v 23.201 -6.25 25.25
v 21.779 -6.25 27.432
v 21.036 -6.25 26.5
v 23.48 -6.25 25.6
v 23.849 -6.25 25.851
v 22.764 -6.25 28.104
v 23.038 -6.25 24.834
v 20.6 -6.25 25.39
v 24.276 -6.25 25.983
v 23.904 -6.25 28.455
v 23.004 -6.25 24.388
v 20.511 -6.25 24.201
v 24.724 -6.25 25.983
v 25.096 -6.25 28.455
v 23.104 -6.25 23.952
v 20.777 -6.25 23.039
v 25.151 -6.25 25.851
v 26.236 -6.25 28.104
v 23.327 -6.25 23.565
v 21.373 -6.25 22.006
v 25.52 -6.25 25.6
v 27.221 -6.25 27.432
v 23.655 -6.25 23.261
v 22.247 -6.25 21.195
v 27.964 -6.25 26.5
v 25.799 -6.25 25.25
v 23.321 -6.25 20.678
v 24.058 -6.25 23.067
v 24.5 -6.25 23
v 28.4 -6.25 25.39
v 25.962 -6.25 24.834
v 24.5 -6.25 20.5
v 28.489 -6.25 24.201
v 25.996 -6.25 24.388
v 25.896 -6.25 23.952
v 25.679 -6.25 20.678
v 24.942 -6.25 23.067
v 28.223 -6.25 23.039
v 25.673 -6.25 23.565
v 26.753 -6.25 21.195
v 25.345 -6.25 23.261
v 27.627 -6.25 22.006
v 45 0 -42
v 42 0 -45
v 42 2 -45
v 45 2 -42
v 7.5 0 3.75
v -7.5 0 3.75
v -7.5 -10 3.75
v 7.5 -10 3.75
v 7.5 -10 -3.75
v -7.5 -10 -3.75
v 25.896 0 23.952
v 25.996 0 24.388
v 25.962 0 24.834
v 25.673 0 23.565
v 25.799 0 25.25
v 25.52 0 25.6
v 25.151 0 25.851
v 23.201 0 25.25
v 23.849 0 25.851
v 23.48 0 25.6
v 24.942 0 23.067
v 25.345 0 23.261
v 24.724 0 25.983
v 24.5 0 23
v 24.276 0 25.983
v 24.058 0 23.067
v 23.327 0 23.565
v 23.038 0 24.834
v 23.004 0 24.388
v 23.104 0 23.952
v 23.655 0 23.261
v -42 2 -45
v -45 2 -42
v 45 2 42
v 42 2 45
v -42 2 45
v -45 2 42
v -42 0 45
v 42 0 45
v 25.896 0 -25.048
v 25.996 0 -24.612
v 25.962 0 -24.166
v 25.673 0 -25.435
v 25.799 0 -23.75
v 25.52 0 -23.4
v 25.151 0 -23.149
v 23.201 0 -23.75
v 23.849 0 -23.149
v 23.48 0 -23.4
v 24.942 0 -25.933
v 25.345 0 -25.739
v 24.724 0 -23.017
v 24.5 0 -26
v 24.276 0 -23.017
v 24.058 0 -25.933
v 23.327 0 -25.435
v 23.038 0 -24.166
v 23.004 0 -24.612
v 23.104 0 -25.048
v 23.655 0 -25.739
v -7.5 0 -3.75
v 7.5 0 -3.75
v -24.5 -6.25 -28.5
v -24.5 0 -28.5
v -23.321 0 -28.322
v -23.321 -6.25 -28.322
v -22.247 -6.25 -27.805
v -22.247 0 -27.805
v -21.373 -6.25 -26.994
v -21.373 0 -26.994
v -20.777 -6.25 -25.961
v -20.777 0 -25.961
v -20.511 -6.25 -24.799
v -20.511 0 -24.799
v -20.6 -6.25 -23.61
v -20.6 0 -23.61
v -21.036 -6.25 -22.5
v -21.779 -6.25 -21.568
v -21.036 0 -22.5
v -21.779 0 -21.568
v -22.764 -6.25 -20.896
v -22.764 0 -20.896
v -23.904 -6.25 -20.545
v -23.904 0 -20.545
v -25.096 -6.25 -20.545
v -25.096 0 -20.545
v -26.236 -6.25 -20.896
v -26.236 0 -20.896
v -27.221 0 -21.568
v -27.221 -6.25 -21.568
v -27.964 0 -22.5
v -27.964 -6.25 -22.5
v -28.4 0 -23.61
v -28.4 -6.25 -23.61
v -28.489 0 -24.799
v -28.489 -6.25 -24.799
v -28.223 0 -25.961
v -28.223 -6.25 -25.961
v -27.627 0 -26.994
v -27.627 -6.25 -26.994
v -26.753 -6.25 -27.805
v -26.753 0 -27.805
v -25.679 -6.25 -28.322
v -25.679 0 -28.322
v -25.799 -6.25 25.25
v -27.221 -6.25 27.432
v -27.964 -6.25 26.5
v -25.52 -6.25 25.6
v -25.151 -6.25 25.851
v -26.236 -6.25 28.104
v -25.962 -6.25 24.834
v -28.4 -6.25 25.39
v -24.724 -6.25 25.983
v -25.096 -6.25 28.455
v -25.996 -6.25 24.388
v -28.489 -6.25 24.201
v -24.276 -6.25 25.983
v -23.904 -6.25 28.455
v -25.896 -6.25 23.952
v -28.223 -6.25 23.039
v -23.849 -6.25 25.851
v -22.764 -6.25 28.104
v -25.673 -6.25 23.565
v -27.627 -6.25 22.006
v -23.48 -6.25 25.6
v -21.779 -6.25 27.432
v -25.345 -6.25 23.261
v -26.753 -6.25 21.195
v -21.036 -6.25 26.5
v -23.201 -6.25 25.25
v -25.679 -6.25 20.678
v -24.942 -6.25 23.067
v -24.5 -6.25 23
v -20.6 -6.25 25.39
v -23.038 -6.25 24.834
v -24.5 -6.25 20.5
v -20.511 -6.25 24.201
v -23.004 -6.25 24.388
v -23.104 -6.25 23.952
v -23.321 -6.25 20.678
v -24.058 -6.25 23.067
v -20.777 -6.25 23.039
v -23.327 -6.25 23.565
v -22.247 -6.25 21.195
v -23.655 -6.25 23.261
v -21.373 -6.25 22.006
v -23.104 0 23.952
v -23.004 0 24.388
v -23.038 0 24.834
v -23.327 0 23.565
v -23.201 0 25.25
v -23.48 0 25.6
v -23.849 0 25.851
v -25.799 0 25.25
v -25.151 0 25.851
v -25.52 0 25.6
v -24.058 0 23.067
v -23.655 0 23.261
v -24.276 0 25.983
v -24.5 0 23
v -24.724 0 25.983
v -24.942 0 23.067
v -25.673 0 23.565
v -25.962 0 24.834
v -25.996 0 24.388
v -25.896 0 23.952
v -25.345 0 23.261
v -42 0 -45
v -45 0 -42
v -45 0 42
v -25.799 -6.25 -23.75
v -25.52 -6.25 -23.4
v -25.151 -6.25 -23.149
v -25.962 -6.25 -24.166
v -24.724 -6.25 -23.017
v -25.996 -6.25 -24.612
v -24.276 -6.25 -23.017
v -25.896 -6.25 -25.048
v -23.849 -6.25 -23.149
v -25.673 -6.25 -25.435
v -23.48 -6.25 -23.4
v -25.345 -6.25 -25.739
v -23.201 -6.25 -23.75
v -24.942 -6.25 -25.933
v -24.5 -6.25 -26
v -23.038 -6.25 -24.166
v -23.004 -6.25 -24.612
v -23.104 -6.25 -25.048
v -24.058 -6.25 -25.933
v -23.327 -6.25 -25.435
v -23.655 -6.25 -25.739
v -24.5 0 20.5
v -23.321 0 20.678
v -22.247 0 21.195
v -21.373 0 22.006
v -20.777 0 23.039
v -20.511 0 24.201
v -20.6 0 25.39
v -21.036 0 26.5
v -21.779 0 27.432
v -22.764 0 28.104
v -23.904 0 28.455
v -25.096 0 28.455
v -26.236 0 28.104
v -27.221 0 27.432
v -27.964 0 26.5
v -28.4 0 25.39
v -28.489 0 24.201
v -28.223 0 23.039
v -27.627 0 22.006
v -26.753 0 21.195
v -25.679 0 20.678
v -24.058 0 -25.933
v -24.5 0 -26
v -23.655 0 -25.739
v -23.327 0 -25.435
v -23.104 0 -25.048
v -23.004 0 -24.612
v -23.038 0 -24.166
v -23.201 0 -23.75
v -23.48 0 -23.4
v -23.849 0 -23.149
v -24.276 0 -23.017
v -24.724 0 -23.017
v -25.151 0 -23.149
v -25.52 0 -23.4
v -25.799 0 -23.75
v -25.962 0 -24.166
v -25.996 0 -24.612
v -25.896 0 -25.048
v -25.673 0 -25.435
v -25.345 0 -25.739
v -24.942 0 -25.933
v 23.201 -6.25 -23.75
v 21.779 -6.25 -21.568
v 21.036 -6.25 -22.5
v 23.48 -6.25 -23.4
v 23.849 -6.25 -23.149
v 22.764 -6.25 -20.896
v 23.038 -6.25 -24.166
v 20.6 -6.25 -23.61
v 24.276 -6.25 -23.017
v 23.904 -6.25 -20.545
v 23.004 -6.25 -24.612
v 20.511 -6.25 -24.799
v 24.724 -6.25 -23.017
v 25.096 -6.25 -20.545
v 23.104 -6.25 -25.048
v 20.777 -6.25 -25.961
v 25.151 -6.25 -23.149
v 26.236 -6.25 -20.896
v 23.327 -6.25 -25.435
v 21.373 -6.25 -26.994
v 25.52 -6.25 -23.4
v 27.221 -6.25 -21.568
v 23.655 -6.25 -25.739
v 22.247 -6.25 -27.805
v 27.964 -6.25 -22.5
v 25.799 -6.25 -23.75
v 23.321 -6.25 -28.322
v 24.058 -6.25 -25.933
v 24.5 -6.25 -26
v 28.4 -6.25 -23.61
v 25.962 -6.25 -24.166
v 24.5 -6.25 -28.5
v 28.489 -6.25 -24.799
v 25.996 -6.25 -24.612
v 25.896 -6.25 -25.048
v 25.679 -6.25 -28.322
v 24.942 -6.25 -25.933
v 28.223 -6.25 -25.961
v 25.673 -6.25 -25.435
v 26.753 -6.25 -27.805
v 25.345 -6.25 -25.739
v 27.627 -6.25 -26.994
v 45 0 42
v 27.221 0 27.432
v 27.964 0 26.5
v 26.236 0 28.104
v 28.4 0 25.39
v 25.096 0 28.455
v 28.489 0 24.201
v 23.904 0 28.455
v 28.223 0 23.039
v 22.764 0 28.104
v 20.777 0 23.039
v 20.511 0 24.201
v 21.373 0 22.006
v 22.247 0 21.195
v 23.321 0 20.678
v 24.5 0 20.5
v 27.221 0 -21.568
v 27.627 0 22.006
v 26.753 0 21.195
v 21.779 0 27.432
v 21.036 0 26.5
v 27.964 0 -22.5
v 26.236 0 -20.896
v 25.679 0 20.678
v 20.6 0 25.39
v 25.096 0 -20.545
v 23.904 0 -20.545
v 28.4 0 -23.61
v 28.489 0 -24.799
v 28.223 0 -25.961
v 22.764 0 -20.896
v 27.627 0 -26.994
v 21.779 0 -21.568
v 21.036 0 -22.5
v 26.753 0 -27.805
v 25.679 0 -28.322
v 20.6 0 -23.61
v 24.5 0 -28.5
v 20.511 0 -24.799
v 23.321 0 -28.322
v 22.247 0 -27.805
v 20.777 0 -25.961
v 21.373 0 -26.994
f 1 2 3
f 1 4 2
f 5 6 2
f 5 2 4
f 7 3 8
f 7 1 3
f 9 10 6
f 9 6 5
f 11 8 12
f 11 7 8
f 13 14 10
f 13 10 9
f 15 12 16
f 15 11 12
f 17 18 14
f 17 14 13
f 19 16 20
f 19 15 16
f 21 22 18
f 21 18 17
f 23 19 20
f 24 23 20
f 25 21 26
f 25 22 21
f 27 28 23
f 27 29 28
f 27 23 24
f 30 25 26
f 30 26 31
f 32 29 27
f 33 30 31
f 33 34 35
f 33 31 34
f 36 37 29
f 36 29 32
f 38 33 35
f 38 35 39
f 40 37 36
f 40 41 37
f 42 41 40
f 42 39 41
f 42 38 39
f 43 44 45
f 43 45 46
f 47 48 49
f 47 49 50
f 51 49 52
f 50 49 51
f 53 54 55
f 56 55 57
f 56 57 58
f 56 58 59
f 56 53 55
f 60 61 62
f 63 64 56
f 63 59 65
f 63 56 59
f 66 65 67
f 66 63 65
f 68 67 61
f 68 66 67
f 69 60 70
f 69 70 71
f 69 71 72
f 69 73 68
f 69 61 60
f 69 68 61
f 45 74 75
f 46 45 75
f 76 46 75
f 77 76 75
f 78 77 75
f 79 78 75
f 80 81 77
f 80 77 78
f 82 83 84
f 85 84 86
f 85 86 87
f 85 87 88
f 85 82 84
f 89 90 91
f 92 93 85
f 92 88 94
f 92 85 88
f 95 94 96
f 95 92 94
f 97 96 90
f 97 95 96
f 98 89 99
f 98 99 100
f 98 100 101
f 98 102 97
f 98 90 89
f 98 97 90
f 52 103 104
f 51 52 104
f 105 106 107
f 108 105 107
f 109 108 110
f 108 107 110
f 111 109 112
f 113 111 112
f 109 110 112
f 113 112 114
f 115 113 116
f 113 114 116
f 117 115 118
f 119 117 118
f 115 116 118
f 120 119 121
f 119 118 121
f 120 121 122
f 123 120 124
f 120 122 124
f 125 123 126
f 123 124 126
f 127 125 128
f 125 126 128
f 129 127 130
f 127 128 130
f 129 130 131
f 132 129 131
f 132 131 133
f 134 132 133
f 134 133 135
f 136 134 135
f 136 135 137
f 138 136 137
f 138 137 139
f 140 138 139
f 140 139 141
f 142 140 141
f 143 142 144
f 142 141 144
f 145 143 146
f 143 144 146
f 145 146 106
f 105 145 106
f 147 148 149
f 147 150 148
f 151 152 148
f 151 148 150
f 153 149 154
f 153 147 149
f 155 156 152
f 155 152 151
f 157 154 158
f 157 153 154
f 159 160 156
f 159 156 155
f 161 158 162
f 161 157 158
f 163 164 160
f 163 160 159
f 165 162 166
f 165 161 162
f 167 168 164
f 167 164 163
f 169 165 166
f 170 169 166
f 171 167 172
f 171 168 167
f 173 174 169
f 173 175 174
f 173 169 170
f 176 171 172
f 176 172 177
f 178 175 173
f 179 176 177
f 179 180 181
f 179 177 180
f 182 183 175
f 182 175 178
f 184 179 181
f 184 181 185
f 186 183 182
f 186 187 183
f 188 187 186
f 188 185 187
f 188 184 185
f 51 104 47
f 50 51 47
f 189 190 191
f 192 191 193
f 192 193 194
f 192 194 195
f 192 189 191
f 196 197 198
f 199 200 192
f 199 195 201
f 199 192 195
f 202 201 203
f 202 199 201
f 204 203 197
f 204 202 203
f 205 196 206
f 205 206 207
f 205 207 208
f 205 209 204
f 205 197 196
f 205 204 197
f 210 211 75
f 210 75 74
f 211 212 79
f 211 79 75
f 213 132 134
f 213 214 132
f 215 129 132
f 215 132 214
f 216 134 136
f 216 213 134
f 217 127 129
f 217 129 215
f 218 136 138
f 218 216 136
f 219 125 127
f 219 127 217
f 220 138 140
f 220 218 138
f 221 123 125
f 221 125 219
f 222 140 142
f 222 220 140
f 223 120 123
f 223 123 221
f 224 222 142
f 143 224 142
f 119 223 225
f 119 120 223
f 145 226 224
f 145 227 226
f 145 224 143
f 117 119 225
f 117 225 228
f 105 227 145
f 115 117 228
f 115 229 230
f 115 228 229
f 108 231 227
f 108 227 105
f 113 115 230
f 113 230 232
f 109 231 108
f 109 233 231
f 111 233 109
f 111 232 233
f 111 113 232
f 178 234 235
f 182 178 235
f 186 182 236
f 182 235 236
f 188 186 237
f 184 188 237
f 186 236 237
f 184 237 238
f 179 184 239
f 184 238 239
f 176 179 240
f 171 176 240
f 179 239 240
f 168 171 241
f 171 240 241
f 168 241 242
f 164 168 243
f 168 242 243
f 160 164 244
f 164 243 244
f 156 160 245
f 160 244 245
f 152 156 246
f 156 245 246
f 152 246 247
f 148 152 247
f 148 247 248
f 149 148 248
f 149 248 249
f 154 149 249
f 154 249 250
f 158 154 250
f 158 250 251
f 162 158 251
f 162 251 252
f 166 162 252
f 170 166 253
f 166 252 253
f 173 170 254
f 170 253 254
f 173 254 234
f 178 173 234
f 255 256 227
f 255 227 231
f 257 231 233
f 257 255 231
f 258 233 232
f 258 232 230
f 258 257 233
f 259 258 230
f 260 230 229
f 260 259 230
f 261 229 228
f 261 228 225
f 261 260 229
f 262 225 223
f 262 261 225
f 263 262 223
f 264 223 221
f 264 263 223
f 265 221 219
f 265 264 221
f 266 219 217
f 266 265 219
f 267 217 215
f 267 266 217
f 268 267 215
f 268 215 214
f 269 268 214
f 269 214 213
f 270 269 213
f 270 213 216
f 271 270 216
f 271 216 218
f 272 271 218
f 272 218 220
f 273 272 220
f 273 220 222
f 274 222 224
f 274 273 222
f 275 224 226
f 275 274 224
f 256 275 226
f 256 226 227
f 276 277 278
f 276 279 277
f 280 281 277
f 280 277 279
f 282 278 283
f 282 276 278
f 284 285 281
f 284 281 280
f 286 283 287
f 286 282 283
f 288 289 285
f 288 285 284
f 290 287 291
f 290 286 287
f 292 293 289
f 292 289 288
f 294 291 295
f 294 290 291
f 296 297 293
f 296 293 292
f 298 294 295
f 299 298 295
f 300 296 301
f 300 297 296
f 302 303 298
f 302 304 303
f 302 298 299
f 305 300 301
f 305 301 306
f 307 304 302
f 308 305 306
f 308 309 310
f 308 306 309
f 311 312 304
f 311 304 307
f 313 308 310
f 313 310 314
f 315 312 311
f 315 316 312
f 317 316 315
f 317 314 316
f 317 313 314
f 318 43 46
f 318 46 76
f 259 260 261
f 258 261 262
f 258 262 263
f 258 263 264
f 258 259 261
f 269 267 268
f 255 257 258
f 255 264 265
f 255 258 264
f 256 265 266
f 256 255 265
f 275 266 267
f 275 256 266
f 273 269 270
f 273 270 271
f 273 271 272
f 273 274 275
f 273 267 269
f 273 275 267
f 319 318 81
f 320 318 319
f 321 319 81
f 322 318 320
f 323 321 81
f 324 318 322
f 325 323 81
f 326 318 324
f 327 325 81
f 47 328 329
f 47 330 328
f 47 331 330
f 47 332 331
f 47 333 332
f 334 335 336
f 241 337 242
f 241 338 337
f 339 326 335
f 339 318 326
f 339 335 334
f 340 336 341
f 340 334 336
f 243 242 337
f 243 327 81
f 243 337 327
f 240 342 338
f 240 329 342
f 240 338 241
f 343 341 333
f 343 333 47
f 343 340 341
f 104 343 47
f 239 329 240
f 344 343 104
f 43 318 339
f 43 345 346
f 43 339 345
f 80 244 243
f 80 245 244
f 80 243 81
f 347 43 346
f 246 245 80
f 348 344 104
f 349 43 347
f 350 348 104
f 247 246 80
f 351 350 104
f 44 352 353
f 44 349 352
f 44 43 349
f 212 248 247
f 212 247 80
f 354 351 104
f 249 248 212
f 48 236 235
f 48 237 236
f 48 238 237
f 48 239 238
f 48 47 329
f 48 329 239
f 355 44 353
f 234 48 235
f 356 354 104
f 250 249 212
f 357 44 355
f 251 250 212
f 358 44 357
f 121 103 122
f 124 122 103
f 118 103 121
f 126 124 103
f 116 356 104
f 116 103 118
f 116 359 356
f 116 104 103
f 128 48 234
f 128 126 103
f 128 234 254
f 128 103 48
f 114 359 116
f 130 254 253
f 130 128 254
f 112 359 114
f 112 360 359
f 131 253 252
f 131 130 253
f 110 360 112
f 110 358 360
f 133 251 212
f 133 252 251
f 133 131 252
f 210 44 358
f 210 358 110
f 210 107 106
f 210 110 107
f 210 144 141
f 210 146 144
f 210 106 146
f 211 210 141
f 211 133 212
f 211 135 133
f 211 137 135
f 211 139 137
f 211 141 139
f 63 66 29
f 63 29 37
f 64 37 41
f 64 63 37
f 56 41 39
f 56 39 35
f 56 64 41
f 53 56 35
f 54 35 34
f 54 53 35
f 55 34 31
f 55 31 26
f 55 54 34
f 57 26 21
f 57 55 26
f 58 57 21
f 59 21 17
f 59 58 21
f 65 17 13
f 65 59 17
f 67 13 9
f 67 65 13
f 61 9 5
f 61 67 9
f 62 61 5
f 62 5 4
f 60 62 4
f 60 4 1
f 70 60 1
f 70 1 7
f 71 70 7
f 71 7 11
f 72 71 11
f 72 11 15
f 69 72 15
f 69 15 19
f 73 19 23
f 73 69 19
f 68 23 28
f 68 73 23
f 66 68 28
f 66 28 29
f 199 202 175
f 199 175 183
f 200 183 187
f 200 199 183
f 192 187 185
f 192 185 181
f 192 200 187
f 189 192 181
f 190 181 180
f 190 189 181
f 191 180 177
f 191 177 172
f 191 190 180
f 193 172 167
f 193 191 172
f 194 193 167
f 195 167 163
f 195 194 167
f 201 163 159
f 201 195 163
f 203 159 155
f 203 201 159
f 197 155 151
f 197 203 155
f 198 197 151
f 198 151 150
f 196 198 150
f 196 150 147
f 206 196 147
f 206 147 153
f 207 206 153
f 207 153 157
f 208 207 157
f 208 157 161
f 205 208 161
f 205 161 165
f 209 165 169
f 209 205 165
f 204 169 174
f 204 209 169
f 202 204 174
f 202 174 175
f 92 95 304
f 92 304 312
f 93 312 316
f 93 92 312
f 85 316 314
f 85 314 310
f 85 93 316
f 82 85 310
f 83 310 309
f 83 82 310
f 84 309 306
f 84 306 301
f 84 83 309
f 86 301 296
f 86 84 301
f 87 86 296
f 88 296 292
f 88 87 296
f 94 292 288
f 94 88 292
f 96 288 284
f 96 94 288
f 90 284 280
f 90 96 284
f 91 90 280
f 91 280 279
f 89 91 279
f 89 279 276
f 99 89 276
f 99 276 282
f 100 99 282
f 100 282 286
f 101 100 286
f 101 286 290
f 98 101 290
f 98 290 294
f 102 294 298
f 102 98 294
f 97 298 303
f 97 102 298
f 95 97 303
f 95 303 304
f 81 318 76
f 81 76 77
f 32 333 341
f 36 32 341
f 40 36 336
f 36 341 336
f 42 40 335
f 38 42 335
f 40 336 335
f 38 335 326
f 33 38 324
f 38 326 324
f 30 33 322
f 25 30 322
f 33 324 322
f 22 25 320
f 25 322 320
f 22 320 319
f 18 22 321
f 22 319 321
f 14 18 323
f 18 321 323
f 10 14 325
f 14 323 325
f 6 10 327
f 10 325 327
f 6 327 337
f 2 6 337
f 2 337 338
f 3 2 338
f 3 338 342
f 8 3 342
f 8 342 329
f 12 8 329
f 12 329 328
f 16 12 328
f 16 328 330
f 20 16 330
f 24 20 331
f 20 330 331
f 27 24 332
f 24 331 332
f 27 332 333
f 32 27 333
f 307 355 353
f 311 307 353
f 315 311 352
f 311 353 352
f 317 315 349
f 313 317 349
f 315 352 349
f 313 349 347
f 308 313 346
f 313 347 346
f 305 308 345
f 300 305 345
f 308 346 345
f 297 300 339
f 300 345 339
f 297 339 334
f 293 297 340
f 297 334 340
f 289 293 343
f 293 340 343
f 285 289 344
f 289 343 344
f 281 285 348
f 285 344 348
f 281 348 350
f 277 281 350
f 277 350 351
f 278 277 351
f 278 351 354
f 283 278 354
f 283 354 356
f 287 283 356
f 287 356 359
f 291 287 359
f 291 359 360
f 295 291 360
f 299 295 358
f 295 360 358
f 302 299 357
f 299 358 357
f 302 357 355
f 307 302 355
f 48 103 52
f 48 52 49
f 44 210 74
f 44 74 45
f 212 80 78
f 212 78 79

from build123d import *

# Parameters (mm, degrees)
BOSS_EXTRU_1_DEPTH = 2
ESQUISSE2_R        = 4
ESQUISSE2_R_2      = 1.5
BOSS_EXTRU_2_DEPTH = 6.25
ESQUISSE3_W        = 15
ESQUISSE3_H        = 7.5
BOSS_EXTRU_3_DEPTH = 10


with BuildPart() as part:
    # Esquisse1 → Boss.-Extru.1 (new body)
    with BuildSketch(Plane(origin=(0, 0, 0), x_dir=(1, 0, 0), z_dir=(0, 1, 0))):
        Polygon((-42, 45), (42, 45), (45, 42), (45, -42), (42, -45), (-42, -45), (-45, -42), (-45, 42), align=None)
    extrude(amount=BOSS_EXTRU_1_DEPTH)

    # Esquisse2 → Boss.-Extru.2 (add)
    # profile 1 of 4: a face of its own
    with BuildSketch(Plane.XZ):
        with Locations(Location((-24.5, 24.5, 0), (0, 0, 270))):
            Circle(ESQUISSE2_R)
        with Locations(Location((-24.5, 24.5, 0), (0, 0, 270))):
            Circle(ESQUISSE2_R_2, mode=Mode.SUBTRACT)
    # profile 2 of 4: a face of its own
    with BuildSketch(Plane.XZ):
        with Locations(Location((24.5, 24.5, 0), (0, 0, 270))):
            Circle(ESQUISSE2_R)
        with Locations(Location((24.5, 24.5, 0), (0, 0, 270))):
            Circle(ESQUISSE2_R_2, mode=Mode.SUBTRACT)
    # profile 3 of 4: a face of its own
    with BuildSketch(Plane.XZ):
        with Locations(Location((-24.5, -24.5, 0), (0, 0, 270))):
            Circle(ESQUISSE2_R)
        with Locations(Location((-24.5, -24.5, 0), (0, 0, 270))):
            Circle(ESQUISSE2_R_2, mode=Mode.SUBTRACT)
    # profile 4 of 4: a face of its own
    with BuildSketch(Plane.XZ):
        with Locations(Location((24.5, -24.5, 0), (0, 0, 270))):
            Circle(ESQUISSE2_R)
        with Locations(Location((24.5, -24.5, 0), (0, 0, 270))):
            Circle(ESQUISSE2_R_2, mode=Mode.SUBTRACT)
    extrude(amount=BOSS_EXTRU_2_DEPTH)

    # Esquisse3 → Boss.-Extru.3 (add)
    with BuildSketch(Plane.XZ):
        Rectangle(ESQUISSE3_W, ESQUISSE3_H)
    extrude(amount=BOSS_EXTRU_3_DEPTH)


solid = part.part
